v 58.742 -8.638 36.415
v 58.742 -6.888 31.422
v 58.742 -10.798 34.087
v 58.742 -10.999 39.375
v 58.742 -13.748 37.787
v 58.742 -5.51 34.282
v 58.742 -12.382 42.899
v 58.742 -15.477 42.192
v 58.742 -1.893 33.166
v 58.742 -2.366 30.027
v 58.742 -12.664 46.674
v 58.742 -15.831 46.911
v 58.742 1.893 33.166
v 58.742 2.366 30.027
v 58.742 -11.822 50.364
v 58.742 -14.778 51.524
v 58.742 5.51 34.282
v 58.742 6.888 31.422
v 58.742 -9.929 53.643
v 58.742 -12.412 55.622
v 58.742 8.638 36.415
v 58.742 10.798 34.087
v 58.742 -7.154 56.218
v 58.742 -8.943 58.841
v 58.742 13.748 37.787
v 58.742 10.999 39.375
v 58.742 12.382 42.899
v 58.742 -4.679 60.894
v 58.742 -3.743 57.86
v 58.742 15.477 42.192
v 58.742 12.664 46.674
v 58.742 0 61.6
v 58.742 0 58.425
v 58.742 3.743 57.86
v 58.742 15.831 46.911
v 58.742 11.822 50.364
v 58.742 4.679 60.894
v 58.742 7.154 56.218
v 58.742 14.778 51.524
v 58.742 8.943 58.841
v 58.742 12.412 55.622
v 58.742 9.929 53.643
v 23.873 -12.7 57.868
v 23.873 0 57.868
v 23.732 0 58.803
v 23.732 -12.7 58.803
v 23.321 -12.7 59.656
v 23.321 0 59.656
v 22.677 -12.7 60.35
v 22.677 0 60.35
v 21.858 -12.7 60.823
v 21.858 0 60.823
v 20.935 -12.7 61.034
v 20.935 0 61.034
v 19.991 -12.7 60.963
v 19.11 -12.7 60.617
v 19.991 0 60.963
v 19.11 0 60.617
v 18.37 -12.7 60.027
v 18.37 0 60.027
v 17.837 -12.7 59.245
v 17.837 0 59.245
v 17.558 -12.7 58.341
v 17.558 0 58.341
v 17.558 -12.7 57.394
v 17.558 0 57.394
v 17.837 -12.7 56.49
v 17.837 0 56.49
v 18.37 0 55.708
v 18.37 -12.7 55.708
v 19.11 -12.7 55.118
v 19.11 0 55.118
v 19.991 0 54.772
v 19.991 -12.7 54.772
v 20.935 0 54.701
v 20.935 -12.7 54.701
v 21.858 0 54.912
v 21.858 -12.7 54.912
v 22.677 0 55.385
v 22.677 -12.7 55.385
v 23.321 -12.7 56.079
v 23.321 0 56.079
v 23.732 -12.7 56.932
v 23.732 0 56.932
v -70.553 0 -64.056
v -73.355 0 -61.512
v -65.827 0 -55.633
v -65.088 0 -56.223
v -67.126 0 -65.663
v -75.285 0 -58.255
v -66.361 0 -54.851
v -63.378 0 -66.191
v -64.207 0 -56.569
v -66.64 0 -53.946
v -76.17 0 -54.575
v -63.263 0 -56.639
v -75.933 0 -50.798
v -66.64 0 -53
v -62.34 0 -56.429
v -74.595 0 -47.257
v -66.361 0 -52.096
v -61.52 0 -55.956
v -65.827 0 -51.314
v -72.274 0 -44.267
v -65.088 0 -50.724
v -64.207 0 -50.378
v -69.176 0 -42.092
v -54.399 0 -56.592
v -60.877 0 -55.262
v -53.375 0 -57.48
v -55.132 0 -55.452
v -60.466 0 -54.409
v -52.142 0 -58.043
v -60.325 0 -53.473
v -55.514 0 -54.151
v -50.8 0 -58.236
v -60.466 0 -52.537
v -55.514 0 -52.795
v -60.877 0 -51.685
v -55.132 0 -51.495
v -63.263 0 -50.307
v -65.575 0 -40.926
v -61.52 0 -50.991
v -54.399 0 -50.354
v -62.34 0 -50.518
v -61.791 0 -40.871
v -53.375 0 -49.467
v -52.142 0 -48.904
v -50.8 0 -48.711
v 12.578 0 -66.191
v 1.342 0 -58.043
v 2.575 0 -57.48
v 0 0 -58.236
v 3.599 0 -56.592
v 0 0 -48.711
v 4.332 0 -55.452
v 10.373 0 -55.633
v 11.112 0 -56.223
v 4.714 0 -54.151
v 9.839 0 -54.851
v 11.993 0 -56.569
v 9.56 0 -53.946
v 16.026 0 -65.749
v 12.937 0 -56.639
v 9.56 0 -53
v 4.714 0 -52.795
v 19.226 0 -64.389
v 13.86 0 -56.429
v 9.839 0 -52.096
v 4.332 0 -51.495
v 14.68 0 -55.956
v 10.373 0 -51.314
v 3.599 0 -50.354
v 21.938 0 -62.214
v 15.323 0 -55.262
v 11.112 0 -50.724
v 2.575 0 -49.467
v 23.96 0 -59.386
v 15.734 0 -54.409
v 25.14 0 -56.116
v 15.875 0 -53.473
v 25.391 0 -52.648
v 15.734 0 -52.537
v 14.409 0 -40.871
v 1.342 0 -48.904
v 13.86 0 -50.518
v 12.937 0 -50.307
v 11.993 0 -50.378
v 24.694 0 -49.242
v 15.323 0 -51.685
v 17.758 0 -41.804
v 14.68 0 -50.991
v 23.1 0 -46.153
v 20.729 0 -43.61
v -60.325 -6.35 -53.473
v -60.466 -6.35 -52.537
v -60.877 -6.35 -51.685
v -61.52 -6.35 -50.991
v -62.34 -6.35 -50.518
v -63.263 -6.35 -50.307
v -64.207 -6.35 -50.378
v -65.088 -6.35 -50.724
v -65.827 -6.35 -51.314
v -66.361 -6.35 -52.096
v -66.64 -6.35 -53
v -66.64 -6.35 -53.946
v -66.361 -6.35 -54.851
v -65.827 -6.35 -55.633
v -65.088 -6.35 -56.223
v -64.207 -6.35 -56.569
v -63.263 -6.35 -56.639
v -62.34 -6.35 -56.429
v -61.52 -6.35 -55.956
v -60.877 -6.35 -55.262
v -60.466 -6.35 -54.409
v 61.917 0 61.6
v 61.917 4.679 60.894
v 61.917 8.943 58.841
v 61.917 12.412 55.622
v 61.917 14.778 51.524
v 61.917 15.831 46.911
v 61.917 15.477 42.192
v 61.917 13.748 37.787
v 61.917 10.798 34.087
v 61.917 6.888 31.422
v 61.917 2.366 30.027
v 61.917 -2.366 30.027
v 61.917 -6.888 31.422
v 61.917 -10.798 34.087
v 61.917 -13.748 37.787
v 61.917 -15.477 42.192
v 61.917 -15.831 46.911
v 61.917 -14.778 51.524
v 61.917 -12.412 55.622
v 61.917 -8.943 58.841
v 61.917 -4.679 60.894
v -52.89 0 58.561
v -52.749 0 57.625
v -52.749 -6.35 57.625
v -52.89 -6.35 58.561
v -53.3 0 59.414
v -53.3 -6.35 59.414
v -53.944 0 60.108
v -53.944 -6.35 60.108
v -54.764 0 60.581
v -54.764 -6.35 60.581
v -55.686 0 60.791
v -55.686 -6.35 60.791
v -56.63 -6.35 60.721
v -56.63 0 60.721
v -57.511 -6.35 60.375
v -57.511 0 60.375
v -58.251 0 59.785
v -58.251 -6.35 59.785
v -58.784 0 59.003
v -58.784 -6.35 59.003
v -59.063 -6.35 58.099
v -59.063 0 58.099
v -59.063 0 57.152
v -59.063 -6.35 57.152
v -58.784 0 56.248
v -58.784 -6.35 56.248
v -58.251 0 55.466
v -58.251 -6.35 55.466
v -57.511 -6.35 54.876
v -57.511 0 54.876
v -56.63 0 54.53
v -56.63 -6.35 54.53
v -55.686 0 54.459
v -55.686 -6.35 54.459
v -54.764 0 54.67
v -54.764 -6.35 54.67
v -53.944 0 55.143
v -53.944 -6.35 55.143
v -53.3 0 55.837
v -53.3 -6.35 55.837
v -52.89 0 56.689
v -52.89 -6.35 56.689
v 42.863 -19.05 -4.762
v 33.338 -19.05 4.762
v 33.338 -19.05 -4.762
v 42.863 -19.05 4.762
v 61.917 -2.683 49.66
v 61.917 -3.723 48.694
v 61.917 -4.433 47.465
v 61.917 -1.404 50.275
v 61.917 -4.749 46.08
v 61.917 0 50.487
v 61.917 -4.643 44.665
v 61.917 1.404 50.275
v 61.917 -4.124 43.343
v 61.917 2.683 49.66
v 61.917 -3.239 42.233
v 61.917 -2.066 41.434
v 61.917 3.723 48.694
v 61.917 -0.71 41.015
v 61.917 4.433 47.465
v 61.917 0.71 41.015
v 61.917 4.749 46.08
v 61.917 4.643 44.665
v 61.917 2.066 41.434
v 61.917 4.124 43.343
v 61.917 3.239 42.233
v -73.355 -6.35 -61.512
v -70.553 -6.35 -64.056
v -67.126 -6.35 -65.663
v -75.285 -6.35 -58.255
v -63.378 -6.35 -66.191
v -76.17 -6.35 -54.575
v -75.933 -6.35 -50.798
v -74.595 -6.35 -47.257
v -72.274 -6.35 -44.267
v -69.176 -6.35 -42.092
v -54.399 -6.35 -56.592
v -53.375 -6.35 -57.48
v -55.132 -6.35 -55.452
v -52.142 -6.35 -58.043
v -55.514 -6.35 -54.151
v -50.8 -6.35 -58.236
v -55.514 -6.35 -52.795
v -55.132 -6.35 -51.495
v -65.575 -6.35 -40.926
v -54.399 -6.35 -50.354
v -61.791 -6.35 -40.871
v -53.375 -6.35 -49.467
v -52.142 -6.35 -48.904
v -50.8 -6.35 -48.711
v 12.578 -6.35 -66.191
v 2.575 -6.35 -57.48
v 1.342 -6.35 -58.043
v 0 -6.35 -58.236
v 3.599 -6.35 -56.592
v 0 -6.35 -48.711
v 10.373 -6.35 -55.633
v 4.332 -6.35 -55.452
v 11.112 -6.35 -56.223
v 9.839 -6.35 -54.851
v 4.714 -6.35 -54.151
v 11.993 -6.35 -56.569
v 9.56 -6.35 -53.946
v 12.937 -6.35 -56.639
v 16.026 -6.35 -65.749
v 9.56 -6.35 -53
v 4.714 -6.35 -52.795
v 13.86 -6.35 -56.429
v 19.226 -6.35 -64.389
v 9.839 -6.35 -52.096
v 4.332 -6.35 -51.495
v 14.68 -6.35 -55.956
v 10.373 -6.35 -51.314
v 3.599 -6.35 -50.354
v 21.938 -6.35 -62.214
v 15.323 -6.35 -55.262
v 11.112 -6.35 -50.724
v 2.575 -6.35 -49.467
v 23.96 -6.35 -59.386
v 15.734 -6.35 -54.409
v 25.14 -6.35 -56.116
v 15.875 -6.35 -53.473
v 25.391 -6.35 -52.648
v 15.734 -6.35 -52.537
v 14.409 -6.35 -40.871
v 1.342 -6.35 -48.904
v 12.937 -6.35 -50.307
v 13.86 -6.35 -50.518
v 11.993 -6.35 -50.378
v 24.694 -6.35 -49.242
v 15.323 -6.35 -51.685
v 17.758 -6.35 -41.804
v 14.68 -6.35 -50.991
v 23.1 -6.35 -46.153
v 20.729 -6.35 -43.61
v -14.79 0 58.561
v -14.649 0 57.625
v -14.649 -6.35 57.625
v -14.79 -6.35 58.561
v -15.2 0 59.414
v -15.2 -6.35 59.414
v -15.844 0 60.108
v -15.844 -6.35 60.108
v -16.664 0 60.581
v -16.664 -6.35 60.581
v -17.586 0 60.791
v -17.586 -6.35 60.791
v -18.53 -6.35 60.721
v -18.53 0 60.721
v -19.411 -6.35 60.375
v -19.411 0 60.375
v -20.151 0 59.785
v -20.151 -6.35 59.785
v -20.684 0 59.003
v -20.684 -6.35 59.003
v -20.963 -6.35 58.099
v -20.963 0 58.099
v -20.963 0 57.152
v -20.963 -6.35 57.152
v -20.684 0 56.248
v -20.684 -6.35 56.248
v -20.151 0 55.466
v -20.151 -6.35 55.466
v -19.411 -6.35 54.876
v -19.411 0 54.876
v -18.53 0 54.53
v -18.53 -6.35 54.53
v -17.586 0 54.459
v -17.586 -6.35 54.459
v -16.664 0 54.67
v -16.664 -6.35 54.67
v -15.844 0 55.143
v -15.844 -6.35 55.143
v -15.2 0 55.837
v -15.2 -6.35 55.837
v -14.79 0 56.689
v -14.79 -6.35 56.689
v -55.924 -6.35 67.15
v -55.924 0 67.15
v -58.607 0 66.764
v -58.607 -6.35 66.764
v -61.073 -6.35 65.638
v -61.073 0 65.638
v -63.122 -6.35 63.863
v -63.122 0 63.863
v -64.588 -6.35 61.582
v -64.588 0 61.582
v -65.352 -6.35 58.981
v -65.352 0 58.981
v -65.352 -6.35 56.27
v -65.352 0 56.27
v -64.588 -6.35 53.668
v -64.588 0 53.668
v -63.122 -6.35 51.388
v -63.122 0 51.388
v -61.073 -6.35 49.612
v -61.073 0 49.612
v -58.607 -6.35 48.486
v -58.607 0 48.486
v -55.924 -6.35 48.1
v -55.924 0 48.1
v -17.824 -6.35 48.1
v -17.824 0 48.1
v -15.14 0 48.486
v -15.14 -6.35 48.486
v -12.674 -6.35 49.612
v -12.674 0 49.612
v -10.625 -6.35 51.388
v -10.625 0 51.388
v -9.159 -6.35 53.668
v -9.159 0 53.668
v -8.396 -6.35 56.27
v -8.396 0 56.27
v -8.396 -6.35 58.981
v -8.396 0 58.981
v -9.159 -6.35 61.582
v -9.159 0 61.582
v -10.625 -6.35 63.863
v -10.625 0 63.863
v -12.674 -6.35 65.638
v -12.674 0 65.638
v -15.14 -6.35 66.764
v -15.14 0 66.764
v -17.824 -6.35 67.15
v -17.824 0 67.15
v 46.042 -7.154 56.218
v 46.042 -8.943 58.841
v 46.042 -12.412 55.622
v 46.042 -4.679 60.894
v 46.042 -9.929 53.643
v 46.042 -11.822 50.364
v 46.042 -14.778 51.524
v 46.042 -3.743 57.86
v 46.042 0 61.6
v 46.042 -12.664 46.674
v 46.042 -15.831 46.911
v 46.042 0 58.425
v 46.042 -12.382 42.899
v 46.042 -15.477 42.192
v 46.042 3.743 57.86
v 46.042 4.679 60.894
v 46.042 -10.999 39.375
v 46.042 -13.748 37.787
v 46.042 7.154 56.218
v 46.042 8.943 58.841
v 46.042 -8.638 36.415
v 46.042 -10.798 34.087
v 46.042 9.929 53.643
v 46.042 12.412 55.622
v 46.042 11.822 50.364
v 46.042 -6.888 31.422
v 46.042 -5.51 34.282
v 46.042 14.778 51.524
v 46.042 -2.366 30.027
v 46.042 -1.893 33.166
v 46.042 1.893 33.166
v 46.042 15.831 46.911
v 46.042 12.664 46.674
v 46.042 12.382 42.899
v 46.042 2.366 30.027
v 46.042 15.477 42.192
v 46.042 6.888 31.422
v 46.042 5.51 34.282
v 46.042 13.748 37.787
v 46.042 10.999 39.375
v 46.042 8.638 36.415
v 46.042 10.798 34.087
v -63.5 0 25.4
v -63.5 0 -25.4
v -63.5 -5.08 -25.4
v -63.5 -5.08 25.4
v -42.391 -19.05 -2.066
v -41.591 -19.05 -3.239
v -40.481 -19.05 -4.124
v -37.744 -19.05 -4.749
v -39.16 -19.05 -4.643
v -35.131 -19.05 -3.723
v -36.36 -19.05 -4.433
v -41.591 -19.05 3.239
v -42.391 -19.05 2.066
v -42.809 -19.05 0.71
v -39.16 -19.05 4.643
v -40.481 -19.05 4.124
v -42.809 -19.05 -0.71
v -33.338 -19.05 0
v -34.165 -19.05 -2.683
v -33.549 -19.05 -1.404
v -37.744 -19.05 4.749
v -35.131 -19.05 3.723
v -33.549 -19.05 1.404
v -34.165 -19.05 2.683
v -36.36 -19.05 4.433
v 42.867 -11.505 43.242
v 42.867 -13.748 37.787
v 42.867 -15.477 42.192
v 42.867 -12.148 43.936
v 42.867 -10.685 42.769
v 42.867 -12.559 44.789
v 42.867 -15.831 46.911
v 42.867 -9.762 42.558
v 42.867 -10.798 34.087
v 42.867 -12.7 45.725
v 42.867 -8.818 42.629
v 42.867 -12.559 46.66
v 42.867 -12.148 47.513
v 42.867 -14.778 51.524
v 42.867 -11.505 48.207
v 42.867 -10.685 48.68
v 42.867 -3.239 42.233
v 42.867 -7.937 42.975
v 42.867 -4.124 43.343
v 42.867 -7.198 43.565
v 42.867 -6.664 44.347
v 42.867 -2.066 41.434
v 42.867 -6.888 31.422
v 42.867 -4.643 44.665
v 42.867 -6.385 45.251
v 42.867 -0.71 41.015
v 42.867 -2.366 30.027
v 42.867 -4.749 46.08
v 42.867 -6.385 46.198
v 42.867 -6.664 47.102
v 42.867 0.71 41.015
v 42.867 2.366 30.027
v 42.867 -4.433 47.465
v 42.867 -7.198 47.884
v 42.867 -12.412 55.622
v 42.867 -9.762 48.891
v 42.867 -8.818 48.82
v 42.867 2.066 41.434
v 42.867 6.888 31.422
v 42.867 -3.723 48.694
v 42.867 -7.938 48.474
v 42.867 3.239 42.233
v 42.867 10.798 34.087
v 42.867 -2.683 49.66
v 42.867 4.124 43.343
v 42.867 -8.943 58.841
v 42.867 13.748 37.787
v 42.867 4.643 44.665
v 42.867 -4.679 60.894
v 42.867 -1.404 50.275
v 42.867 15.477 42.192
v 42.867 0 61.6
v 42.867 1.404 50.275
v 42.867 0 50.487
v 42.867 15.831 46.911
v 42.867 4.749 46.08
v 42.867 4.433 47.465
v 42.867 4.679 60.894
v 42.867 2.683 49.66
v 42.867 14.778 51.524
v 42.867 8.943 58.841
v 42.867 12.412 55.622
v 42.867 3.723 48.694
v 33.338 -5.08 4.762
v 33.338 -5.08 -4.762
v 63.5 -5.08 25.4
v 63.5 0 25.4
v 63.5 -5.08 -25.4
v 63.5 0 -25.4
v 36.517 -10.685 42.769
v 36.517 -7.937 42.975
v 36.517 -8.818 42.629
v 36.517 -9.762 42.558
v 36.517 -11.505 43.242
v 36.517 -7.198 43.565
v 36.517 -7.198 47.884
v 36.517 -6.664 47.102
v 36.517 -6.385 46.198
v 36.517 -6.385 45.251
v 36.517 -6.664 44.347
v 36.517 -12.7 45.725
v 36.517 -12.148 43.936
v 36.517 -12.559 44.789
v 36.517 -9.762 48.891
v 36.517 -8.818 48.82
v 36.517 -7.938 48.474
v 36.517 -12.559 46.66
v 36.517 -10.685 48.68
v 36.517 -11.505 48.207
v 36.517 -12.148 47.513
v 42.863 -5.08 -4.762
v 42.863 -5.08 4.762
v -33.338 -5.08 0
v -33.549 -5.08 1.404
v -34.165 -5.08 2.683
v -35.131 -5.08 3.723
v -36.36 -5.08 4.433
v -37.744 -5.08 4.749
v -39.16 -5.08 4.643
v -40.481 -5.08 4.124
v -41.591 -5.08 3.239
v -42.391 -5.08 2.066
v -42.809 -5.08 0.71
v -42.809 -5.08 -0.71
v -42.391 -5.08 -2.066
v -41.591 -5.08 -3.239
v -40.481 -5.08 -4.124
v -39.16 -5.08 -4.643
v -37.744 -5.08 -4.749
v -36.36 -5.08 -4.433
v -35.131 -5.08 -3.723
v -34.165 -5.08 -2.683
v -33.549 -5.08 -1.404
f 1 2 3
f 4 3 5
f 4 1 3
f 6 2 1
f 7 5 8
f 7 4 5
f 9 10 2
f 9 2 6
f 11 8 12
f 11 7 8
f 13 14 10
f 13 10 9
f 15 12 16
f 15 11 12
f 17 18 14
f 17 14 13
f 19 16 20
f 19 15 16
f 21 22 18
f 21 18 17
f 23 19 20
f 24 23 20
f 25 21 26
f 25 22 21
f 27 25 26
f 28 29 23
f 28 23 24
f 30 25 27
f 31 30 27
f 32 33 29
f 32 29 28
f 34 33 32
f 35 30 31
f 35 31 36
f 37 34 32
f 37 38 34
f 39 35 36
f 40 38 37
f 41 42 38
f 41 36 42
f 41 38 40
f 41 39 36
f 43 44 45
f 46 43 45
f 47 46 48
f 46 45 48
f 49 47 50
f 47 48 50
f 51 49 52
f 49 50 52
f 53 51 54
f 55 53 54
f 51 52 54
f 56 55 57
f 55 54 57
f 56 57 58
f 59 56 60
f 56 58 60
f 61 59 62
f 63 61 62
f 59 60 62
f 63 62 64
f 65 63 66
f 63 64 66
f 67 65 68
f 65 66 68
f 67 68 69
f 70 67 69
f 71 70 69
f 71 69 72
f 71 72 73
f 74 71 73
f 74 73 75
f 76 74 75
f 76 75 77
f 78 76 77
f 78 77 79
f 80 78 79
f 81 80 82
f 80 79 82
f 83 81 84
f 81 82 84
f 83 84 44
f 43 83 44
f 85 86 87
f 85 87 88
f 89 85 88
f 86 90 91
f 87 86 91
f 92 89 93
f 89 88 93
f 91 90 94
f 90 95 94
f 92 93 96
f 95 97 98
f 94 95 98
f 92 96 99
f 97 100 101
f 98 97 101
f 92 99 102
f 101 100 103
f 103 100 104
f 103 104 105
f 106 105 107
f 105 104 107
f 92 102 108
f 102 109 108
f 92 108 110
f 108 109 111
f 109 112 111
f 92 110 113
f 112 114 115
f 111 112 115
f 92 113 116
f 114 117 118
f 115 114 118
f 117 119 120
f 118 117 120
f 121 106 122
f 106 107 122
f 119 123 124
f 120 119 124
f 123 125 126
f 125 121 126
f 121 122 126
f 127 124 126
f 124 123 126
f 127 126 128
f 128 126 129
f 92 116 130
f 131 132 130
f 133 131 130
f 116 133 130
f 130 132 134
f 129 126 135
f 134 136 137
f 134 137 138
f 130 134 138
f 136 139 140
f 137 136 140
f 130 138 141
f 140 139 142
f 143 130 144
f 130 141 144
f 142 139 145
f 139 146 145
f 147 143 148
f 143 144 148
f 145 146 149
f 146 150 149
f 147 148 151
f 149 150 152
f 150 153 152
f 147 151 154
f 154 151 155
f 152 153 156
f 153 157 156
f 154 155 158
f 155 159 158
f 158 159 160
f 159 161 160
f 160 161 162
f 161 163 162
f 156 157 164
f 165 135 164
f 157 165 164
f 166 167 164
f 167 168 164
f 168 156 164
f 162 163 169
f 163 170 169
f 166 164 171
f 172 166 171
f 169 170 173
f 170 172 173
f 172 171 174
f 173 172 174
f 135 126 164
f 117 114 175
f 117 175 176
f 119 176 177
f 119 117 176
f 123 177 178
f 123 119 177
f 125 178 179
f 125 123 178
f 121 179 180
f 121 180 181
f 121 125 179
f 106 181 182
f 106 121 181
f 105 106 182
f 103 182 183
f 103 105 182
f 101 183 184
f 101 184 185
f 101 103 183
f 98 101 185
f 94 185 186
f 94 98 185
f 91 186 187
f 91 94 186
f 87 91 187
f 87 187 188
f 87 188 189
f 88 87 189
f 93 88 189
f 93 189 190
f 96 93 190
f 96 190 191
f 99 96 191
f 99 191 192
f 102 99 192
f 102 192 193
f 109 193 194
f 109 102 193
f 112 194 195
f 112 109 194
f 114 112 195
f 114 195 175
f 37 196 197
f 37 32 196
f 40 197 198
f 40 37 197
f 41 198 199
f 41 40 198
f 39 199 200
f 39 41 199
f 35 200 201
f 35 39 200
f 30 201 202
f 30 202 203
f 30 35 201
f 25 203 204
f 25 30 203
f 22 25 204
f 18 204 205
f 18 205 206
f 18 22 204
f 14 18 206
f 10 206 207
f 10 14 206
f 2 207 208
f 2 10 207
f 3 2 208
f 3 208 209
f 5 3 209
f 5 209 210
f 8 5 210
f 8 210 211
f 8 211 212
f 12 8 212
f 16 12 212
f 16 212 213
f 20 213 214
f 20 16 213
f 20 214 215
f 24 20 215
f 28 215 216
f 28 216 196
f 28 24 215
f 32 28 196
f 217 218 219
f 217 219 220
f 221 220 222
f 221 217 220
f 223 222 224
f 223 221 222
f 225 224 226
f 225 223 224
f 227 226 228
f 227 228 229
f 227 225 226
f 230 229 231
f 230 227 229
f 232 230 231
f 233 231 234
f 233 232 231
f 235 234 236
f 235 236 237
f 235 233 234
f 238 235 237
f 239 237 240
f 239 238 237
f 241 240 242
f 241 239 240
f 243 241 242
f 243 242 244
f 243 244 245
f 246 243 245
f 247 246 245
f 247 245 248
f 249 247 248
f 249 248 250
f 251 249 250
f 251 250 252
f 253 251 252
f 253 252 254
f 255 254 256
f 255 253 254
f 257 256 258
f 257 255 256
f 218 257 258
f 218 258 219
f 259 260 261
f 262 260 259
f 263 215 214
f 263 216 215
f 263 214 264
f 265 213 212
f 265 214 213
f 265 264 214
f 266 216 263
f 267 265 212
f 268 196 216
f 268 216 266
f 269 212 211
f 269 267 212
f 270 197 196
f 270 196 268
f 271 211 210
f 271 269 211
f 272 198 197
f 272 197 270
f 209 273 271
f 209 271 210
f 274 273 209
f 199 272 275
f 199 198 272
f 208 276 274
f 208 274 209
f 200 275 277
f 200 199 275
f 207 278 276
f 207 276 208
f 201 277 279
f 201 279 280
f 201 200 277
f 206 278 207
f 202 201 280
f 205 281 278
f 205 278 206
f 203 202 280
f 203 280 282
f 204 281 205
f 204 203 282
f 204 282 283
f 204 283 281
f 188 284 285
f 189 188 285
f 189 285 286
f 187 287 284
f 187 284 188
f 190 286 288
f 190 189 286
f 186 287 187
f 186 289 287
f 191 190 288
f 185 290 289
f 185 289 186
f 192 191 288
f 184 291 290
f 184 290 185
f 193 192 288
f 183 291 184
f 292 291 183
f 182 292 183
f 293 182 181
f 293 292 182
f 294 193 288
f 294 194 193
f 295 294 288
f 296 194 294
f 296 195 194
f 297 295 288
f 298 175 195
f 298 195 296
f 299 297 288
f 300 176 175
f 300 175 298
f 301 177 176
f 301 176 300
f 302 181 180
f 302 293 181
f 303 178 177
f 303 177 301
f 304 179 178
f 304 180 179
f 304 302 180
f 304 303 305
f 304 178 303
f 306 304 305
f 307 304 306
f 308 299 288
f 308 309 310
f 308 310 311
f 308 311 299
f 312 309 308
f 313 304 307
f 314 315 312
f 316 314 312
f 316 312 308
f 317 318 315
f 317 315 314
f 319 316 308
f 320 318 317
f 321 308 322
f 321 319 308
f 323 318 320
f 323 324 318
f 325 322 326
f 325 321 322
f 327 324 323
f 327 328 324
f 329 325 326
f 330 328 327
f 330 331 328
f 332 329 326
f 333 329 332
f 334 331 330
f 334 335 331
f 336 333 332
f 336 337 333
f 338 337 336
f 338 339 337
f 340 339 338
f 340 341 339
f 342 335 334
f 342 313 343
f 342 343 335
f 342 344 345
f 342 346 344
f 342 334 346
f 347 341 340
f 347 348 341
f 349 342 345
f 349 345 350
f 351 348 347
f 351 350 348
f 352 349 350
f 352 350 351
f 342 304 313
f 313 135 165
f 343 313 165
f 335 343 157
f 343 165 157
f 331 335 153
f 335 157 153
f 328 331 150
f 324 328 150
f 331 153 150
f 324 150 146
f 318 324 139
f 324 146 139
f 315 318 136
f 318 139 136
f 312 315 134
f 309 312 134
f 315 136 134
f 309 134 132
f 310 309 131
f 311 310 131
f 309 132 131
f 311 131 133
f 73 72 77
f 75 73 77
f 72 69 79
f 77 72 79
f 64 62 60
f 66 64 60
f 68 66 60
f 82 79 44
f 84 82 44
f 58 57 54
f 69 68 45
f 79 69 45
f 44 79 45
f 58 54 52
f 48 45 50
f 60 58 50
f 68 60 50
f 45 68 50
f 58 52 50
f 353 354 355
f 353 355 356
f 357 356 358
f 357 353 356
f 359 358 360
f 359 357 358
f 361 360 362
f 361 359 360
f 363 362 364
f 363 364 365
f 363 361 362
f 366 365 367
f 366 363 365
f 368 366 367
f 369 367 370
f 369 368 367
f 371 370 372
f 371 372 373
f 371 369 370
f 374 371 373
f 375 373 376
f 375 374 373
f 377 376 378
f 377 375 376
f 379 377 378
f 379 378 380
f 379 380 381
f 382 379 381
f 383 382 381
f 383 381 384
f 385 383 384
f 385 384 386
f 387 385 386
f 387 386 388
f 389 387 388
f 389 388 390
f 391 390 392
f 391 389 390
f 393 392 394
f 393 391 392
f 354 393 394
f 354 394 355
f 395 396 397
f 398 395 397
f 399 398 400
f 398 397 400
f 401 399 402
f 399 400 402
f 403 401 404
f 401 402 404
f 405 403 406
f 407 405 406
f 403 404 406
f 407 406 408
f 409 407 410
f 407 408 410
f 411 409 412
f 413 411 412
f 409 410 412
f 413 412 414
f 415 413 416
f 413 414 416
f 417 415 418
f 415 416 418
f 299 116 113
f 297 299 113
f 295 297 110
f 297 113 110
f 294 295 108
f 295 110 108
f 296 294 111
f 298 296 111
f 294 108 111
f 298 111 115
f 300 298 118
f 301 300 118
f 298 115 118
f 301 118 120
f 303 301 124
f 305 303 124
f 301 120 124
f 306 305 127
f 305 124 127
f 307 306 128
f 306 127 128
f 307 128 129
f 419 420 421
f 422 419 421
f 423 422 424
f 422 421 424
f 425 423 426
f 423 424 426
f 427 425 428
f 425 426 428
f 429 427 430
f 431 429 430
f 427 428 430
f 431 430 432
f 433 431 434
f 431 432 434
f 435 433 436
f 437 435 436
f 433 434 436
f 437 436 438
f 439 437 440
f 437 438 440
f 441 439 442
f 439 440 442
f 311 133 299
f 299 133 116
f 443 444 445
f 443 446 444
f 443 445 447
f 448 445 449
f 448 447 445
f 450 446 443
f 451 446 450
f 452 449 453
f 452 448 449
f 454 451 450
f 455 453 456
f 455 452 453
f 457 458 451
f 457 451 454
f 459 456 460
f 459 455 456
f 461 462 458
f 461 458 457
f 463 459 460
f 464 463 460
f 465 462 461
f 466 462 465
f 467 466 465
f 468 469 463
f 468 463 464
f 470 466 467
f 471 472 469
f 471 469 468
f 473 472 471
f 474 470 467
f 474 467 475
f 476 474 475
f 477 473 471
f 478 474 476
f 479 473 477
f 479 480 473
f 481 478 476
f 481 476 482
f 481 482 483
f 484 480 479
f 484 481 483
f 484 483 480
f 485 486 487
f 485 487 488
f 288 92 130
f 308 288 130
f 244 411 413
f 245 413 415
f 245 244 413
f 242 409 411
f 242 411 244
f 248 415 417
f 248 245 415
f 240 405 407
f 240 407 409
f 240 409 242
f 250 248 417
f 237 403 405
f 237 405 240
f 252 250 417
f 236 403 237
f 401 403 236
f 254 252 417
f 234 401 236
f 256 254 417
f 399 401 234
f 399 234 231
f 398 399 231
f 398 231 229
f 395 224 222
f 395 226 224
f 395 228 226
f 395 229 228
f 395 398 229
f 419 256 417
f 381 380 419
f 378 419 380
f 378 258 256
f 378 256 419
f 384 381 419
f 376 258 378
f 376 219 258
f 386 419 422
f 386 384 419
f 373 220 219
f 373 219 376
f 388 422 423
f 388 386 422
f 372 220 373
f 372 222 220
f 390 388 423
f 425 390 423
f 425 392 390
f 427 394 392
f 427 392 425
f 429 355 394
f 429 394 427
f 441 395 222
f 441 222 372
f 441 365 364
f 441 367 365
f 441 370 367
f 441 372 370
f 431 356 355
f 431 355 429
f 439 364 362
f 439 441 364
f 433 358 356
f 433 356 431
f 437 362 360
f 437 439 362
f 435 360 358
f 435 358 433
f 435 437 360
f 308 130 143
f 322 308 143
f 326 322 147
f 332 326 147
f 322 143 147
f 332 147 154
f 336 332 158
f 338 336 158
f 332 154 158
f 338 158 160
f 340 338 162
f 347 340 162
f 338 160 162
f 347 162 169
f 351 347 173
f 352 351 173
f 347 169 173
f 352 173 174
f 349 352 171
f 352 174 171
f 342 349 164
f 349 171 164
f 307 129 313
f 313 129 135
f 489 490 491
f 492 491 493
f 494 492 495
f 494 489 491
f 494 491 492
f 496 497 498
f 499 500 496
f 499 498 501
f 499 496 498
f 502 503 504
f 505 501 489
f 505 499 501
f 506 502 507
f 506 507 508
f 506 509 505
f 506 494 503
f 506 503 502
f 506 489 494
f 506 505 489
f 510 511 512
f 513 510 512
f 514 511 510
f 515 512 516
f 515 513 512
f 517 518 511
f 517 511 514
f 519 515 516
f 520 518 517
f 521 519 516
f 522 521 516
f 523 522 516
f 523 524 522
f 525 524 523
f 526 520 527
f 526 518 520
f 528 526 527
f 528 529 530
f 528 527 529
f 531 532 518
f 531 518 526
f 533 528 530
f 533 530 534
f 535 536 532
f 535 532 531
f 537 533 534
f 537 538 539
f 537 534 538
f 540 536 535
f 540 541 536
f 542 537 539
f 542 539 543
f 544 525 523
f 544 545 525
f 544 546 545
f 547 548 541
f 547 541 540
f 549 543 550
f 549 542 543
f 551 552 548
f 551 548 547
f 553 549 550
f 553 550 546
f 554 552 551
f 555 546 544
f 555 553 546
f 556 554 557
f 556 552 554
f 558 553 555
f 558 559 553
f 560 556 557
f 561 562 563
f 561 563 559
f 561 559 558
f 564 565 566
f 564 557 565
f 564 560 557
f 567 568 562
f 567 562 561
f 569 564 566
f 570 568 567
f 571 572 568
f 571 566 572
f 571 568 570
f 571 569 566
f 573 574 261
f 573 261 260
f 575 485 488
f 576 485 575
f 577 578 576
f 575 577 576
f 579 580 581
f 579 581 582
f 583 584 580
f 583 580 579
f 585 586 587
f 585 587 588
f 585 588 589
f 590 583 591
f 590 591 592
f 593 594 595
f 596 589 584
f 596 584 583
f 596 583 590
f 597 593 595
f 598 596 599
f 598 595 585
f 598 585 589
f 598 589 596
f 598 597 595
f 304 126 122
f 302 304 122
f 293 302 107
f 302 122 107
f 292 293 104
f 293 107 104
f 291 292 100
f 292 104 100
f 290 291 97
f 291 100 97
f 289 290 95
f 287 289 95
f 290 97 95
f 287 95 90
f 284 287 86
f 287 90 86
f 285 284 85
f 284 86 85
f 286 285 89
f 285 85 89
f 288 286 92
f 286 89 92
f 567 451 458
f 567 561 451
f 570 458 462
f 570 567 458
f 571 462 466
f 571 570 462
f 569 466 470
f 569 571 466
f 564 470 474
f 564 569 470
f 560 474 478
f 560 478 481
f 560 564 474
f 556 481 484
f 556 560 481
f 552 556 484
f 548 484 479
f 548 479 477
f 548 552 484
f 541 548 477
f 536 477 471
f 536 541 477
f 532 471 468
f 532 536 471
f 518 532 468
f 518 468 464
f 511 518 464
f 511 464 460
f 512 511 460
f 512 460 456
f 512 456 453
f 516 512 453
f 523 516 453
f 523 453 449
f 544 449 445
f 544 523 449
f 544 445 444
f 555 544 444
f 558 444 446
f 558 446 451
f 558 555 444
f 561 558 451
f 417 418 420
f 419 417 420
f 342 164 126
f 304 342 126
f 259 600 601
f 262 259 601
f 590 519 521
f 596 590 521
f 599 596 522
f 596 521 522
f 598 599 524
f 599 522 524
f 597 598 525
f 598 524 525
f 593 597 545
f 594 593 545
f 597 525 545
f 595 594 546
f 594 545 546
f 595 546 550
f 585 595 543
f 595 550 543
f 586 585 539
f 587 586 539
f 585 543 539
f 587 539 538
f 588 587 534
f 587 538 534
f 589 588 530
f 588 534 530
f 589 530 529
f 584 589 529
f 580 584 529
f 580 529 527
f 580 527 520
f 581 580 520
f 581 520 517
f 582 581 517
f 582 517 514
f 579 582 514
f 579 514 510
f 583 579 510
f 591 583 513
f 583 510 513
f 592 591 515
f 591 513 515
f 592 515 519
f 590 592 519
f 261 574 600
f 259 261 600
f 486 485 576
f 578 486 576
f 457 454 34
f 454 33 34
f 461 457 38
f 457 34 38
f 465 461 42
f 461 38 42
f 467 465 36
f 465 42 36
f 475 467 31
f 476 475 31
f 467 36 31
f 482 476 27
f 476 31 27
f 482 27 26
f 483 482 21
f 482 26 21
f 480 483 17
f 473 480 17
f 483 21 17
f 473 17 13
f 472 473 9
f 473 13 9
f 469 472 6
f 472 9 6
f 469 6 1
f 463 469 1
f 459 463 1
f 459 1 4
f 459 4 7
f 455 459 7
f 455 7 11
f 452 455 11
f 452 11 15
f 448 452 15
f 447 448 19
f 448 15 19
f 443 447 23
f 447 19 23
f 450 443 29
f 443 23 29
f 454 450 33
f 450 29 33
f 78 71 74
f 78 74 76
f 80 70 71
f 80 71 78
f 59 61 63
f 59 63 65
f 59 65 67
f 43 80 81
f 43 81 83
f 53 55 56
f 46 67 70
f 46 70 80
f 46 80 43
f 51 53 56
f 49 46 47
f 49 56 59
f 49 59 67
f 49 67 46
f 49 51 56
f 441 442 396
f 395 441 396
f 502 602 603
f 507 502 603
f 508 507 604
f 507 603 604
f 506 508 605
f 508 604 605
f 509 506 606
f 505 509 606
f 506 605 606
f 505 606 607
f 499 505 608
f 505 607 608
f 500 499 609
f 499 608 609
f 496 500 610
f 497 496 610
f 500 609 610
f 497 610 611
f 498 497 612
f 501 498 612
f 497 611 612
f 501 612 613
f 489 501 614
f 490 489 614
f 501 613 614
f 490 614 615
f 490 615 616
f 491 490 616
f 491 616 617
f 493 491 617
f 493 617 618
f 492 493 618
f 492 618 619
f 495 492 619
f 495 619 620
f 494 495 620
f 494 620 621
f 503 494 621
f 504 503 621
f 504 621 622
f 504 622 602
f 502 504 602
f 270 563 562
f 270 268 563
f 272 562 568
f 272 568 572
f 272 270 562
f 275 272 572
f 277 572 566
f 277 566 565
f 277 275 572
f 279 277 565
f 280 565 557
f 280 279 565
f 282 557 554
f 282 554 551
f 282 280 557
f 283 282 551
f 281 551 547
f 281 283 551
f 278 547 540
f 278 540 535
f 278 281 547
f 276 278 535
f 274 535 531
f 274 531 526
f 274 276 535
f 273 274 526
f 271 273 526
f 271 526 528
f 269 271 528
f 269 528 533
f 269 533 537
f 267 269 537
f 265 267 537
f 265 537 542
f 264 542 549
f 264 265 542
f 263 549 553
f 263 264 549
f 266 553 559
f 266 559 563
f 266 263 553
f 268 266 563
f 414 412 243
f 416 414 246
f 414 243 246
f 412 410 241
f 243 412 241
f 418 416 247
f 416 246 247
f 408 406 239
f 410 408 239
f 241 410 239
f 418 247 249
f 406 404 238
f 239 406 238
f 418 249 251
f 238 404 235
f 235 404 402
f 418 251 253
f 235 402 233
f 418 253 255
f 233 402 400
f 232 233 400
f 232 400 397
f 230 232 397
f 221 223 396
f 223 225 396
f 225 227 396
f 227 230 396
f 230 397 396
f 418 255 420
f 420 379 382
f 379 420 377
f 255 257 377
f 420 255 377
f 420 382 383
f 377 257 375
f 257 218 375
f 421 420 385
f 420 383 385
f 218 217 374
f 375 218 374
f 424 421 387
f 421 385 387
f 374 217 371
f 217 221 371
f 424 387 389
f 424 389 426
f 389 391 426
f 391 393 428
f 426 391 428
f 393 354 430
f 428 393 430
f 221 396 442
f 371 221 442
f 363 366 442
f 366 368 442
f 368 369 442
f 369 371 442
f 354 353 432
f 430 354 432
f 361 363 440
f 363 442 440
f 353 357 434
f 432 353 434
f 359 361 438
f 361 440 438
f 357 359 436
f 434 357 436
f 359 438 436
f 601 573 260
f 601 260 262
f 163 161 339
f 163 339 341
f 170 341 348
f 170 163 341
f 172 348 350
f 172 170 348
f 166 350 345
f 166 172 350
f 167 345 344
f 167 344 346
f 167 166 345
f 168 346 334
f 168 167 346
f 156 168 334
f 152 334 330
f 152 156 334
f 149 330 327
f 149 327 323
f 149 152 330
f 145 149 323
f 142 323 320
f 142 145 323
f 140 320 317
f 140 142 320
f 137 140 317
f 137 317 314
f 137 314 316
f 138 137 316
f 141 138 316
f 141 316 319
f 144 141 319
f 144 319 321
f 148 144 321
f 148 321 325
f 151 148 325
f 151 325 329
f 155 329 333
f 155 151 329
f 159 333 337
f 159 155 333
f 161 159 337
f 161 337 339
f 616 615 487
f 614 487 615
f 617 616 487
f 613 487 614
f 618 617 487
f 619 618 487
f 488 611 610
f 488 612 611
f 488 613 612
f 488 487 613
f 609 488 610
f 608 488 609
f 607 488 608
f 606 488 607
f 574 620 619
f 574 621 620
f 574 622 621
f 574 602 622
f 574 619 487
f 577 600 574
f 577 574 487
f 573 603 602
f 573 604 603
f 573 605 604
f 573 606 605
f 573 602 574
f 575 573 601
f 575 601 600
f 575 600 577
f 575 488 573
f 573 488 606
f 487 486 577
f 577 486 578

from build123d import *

# Parameters (mm, degrees)
F0_W      = 9.525
F0_H      = 9.525
F1_DEPTH  = 19.05
F0_W_2    = 127
F0_H_2    = 50.8
F0_R      = 4.7625
F2_DEPTH  = 5.08
F3_R      = 3.175
F4_DEPTH  = 6.35
F5_R      = 3.175
F6_DEPTH  = 6.35
F7_R      = 3.175
F8_DEPTH  = 12.7
F9_W      = 12.7
F9_H      = 7.9375
F11_R     = 3.175
F12_DEPTH = 6.35
F13_DEPTH = 19.05


with BuildPart() as f1:
    # F0 (on Front) → F1 (new body)
    with BuildSketch(Plane.XZ):
        with Locations((38.1, 0)):
            Rectangle(F0_W, F0_H)
    extrude(amount=F1_DEPTH)

    # F0 (on Front) → F2 (join)
    with BuildSketch(Plane.XZ):
        Rectangle(F0_W_2, F0_H_2)
        with Locations((-38.1, 0)):
            Circle(F0_R, mode=Mode.SUBTRACT)
        with Locations((38.1, 0)):
            Rectangle(F0_W, F0_H, mode=Mode.SUBTRACT)
    extrude(amount=F2_DEPTH)

    # F0 (on Front) → F13 (join)
    with BuildSketch(Plane.XZ):
        with Locations((-38.1, 0)):
            Circle(F0_R)
    extrude(amount=F13_DEPTH)


with BuildPart() as f4:
    # F3 (on Front) → F4 (new body)
    with BuildSketch(Plane.XZ):
        with BuildLine():
            Line((-55.92355, 48.100311), (-17.82355, 48.100311))
            ThreePointArc((-17.82355, 48.100311), (-8.29855, 57.625311), (-17.82355, 67.150311))
            Line((-17.82355, 67.150311), (-55.92355, 67.150311))
            ThreePointArc((-55.92355, 67.150311), (-65.44855, 57.625311), (-55.92355, 48.100311))
        make_face()
        with Locations((-55.92355, 57.625311)):
            Circle(F3_R, mode=Mode.SUBTRACT)
        with Locations((-17.82355, 57.625311)):
            Circle(F3_R, mode=Mode.SUBTRACT)
    extrude(amount=F4_DEPTH)


with BuildPart() as f6:
    # F5 (on Front) → F6 (new body)
    with BuildSketch(Plane.XZ):
        with BuildLine():
            Line((14.409332, -40.870554), (-61.790668, -40.870554))
            ThreePointArc((-61.790668, -40.870554), (-76.193164, -52.677533), (-63.377939, -66.190737))
            Line((-63.377939, -66.190737), (12.577939, -66.190737))
            ThreePointArc((12.577939, -66.190737), (25.384943, -54.390736), (14.409332, -40.870554))
        make_face()
        with Locations((-63.5, -53.473242)):
            Circle(F5_R, mode=Mode.SUBTRACT)
        with BuildLine():
            Line((-50.8, -48.710742), (-25.4, -48.710742))
            Line((-25.4, -48.710742), (0, -48.710742))
            ThreePointArc((0, -48.710742), (4.7625, -53.473242), (0, -58.235742))
            Line((0, -58.235742), (-25.4, -58.235742))
            Line((-25.4, -58.235742), (-50.8, -58.235742))
            ThreePointArc((-50.8, -58.235742), (-55.5625, -53.473242), (-50.8, -48.710742))
        make_face(mode=Mode.SUBTRACT)
        with Locations((12.7, -53.473242)):
            Circle(F5_R, mode=Mode.SUBTRACT)
    extrude(amount=F6_DEPTH)


with BuildPart() as f8:
    # F7 (on Front) → F8 (new body)
    with BuildSketch(Plane.XZ):
        with Locations((20.697569, 57.867613)):
            Circle(F7_R)
    extrude(amount=F8_DEPTH)


with BuildPart() as f10:
    # F9 (on Front) → F10 (revolve)
    with BuildSketch(Plane.XZ):
        Polygon((46.041697, 50.48707), (46.041697, 58.42457), (46.041697, 61.59957), (42.866697, 61.59957), (42.866697, 50.48707), align=None)
        with Locations((52.391697, 54.45582)):
            Rectangle(F9_W, F9_H)
        Polygon((58.741697, 61.59957), (58.741697, 58.42457), (58.741697, 50.48707), (61.916697, 50.48707), (61.916697, 61.59957), align=None)
    revolve(axis=Axis((45.960464, 0, 45.72457), (-1, 0, 0)))

    # F11 (on face) → F12 (join)
    with BuildSketch(Plane(origin=(42.866697, 0, 0), x_dir=(0, -1, 0), z_dir=(-1, 0, 0))):
        with Locations((9.525, 45.72457)):
            Circle(F11_R)
    extrude(amount=F12_DEPTH)


solid = Compound([f1.part, f4.part, f6.part, f8.part, f10.part])
